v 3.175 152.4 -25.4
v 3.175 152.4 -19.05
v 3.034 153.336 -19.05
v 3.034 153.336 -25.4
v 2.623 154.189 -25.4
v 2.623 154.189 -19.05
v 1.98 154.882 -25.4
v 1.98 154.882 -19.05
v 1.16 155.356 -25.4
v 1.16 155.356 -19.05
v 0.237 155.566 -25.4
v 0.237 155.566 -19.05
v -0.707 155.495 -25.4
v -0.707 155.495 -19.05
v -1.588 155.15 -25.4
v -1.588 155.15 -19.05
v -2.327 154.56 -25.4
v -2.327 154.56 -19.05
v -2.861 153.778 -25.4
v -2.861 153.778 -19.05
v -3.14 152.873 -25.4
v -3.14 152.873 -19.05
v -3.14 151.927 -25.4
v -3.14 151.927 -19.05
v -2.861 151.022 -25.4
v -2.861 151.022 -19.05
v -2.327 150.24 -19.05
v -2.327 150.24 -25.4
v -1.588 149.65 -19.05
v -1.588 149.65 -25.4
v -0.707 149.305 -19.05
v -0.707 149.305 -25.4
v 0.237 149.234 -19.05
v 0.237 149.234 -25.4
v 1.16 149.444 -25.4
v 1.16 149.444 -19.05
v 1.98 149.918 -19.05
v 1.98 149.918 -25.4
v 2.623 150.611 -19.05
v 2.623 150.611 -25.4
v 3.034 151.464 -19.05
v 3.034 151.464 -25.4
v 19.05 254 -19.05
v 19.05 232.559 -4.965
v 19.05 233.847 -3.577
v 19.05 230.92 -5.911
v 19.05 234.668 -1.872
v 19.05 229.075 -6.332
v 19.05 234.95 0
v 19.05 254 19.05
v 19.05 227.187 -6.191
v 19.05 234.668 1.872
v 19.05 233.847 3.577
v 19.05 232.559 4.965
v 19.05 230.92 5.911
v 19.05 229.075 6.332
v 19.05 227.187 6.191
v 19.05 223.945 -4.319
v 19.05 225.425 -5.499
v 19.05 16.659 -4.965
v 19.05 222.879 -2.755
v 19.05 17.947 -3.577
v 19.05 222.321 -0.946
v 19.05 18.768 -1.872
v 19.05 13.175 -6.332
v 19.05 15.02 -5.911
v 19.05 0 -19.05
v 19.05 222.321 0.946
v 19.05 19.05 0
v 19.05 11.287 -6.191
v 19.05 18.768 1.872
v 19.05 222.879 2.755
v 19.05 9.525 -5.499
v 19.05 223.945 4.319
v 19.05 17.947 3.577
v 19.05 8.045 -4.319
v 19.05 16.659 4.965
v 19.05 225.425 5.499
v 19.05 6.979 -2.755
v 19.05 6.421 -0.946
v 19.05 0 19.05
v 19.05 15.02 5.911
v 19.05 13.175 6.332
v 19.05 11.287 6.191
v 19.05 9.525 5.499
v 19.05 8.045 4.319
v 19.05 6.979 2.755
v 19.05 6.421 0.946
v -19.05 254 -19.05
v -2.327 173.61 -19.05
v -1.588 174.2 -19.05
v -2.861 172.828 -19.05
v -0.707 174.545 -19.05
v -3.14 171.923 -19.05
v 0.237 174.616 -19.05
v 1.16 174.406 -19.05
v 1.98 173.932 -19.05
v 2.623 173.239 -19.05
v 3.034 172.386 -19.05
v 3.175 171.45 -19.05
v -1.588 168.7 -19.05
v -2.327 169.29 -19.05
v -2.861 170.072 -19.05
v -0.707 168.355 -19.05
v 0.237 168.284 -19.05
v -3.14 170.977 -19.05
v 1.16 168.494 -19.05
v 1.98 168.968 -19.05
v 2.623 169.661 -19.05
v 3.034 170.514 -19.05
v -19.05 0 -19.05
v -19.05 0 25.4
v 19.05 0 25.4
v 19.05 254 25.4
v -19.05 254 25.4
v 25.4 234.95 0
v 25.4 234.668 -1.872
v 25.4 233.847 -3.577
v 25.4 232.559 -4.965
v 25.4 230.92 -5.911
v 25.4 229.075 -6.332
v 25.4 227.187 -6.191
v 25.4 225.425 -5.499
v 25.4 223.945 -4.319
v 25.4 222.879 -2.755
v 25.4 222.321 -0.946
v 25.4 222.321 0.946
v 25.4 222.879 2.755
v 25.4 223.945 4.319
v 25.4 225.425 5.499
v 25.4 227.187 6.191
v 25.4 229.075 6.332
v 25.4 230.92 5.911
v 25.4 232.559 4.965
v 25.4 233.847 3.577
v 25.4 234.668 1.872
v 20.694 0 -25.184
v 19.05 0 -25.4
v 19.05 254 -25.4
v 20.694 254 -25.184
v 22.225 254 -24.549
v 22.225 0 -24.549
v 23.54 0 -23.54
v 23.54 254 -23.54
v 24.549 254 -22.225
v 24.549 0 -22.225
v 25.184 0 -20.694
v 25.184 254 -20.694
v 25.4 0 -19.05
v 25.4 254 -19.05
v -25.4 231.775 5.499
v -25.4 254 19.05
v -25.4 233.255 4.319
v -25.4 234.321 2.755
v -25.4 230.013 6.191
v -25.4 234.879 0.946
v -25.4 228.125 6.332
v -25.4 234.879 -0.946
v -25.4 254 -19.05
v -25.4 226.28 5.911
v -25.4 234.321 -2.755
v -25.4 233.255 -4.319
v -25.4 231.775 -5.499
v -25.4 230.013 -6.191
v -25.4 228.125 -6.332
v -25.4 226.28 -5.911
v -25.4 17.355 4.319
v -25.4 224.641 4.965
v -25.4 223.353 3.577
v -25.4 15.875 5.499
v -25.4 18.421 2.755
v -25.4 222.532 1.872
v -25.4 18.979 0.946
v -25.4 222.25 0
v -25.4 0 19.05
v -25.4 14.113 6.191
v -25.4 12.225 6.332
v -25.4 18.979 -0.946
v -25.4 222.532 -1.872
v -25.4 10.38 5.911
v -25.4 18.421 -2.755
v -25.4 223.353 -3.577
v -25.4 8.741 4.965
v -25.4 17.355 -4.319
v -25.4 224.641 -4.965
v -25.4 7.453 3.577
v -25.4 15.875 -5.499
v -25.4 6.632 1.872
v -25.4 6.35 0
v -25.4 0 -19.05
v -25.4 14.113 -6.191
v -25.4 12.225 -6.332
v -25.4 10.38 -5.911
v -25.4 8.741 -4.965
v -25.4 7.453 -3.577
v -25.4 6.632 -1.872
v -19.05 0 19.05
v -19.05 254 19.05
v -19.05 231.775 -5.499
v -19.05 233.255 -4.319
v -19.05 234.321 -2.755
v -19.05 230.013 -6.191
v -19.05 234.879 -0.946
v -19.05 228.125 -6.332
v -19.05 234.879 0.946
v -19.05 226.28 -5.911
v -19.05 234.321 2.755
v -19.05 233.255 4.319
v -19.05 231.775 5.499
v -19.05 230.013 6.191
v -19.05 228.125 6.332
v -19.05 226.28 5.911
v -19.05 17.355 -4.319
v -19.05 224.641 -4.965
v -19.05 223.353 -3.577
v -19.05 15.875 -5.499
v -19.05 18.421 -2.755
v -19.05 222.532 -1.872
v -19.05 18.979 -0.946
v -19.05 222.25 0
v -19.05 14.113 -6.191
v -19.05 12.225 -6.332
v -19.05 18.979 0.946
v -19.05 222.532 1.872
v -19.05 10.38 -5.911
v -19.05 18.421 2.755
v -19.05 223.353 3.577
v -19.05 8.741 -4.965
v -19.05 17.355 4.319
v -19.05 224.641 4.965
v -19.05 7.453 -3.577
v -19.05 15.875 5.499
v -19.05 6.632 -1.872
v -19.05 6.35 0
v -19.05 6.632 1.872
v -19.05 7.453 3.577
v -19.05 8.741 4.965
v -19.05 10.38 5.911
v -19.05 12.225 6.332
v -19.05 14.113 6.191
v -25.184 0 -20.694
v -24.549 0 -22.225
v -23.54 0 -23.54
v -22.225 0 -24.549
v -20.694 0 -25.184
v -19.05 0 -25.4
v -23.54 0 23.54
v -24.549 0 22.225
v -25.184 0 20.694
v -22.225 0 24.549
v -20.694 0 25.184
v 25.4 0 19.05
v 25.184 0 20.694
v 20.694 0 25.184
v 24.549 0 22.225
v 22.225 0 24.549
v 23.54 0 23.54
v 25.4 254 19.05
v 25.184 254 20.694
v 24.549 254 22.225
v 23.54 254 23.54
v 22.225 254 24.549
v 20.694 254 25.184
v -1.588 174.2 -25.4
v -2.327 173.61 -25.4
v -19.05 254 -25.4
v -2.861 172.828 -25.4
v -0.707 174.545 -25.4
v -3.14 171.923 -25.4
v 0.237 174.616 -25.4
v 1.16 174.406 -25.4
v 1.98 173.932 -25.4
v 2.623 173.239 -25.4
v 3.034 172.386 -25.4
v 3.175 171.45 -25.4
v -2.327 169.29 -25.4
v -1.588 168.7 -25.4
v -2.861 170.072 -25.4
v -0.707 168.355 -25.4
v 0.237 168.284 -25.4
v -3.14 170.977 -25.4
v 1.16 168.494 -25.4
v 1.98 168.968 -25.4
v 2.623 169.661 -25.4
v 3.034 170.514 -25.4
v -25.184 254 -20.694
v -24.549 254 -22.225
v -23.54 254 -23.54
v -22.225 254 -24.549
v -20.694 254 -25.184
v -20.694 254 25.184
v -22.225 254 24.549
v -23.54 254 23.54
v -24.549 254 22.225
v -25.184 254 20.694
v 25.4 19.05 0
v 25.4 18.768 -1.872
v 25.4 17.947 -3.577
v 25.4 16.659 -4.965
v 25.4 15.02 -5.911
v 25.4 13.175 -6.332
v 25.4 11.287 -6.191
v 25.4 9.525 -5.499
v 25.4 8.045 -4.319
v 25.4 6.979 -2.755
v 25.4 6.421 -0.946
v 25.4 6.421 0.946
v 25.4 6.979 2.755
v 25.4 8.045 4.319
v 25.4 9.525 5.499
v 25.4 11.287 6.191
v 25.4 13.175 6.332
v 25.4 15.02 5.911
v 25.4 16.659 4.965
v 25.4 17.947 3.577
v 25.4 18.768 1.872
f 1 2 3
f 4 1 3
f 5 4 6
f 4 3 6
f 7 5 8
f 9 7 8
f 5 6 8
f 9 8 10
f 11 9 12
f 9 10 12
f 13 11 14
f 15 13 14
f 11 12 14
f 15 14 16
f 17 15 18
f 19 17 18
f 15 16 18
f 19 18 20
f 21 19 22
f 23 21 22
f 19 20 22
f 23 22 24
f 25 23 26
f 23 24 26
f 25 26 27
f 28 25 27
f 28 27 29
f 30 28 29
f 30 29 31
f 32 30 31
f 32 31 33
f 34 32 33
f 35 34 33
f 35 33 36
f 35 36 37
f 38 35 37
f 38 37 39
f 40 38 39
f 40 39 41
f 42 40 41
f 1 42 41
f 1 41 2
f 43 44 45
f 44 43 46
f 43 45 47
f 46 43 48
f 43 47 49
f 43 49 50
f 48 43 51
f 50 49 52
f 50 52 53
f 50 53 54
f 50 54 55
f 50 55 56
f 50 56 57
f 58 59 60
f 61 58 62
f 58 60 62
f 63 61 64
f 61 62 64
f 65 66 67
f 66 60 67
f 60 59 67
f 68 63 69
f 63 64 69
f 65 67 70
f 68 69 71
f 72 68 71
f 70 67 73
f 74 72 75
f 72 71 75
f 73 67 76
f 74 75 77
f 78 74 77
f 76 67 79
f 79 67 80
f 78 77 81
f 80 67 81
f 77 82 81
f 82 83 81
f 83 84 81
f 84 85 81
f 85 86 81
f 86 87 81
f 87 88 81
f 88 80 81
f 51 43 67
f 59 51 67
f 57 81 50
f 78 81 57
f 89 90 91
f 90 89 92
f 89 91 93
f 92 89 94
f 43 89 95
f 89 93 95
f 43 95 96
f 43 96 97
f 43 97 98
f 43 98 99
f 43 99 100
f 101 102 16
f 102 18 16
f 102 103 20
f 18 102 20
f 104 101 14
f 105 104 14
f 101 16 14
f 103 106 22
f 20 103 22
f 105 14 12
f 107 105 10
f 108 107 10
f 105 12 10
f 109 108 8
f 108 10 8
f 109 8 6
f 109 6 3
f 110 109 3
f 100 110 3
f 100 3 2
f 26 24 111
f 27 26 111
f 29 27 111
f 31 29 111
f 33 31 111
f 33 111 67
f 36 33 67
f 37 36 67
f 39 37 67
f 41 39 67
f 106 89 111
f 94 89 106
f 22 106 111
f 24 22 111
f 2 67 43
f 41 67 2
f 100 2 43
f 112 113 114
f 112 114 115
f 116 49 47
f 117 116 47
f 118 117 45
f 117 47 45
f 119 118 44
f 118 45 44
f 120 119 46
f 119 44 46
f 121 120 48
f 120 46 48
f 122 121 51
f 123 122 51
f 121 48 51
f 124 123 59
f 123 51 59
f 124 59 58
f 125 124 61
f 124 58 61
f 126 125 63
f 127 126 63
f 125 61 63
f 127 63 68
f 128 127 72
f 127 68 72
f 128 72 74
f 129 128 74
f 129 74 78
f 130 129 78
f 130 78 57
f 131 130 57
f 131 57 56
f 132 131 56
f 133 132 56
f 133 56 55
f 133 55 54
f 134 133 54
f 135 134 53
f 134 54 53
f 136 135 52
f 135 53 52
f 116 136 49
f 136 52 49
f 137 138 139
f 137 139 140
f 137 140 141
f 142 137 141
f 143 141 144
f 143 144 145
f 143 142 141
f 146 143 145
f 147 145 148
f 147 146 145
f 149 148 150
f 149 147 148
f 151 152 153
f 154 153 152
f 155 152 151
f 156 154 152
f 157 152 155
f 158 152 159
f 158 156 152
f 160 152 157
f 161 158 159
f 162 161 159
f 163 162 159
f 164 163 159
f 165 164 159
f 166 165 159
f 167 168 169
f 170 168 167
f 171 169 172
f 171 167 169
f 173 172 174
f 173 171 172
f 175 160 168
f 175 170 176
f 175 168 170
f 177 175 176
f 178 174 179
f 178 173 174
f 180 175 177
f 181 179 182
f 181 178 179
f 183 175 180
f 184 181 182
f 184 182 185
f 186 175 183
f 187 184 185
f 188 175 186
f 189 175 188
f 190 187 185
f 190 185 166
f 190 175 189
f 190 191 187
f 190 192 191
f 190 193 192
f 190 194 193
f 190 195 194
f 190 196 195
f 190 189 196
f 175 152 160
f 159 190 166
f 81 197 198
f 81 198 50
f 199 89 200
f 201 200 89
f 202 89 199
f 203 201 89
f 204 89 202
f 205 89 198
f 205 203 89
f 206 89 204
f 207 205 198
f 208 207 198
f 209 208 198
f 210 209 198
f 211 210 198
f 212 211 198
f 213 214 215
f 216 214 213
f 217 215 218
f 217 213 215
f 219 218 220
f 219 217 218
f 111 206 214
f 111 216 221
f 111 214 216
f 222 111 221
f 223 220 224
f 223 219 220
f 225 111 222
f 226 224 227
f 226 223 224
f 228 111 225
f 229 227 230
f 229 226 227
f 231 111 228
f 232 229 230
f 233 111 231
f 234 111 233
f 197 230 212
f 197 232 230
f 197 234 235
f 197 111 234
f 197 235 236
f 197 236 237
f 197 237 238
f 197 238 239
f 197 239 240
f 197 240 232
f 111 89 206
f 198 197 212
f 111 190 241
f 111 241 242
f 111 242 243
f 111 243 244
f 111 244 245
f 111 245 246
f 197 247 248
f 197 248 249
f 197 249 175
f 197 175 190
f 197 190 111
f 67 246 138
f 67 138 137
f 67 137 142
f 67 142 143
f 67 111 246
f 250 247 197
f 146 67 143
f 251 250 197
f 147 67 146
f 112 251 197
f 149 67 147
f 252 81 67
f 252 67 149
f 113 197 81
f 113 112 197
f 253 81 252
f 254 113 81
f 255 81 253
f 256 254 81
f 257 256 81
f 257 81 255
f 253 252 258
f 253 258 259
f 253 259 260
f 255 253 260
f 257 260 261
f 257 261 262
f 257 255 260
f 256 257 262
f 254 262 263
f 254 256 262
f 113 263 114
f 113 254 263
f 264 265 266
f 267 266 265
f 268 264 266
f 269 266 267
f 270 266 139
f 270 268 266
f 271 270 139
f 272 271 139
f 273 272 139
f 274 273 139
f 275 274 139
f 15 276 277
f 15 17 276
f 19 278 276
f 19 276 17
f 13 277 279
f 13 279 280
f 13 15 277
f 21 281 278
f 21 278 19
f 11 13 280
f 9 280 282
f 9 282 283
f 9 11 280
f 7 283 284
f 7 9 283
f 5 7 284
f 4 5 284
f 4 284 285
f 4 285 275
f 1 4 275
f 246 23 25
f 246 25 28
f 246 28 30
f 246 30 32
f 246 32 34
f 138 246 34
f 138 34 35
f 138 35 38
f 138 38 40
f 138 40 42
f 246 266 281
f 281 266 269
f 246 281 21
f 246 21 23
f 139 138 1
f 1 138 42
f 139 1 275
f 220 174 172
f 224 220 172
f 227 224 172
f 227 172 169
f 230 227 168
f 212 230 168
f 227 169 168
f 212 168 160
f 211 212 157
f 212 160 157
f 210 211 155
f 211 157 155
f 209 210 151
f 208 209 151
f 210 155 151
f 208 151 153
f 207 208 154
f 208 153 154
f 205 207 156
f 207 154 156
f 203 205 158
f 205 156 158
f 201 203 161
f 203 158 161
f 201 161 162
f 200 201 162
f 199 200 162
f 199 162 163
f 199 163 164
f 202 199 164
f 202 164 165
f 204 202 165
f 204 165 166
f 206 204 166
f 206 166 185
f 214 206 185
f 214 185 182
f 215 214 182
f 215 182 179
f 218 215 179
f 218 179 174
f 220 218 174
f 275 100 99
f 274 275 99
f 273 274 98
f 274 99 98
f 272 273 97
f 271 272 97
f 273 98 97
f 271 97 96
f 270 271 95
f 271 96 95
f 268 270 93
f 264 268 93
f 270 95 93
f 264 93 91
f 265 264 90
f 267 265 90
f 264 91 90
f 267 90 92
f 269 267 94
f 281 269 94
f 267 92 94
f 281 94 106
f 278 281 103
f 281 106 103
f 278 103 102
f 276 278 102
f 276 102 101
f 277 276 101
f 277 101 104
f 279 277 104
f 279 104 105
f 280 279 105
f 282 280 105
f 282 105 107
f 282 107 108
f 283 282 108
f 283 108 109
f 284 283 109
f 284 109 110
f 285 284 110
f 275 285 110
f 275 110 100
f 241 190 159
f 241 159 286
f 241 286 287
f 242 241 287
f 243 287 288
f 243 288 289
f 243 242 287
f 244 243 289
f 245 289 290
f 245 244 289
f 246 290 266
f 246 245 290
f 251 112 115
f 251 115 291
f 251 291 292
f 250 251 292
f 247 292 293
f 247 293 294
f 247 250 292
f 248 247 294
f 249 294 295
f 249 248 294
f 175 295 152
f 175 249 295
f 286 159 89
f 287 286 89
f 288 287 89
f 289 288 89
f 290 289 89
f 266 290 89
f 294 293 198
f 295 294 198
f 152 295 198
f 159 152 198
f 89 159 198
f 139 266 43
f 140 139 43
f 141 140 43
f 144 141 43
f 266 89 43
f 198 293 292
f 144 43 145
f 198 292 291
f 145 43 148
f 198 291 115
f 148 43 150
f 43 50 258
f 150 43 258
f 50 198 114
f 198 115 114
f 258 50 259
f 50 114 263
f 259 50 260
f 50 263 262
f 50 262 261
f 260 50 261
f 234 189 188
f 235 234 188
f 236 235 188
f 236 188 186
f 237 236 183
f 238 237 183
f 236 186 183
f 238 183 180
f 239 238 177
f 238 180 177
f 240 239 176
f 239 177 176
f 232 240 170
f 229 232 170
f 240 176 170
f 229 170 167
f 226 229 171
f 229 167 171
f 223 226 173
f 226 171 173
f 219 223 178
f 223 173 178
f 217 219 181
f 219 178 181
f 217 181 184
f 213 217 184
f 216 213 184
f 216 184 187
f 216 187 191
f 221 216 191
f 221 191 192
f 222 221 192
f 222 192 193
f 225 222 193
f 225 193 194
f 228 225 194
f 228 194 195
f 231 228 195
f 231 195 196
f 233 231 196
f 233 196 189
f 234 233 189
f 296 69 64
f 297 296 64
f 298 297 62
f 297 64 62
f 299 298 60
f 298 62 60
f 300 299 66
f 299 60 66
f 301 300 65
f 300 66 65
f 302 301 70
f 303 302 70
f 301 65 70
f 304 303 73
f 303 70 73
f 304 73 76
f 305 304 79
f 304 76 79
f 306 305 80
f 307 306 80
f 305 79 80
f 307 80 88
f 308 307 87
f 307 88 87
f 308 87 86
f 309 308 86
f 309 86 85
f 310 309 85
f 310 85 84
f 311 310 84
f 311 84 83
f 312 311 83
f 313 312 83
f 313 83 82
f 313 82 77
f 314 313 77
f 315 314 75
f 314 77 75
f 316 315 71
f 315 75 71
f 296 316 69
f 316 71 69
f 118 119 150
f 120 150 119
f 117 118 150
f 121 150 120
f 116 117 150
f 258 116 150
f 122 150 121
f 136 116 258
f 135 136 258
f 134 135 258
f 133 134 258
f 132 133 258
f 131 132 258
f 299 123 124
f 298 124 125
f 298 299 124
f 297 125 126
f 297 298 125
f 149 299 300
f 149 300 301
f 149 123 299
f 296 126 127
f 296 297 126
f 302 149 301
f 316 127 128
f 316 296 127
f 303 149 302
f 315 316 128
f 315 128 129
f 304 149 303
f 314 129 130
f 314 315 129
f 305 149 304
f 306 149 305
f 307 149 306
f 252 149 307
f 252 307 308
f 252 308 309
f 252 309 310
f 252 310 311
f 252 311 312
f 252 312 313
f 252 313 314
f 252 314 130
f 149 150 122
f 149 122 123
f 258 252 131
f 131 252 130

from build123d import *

# Parameters (mm, degrees)
F0_W     = 38.1
F0_H     = 38.1
F4_DEPTH = 254
F6_D     = 12.7
F6_DEPTH = 25.401
F1_D     = 12.7
F3_D     = 6.35
F3_DEPTH = 25.401


with BuildPart() as f4:
    # F0 (on Front) → F4 (new body)
    with BuildSketch(Plane.XZ):
        with BuildLine():
            Line((-19.05, -25.4), (19.05, -25.4))
            ThreePointArc((19.05, -25.4), (23.5401280605, -23.5401280605), (25.4, -19.05))
            Line((25.4, -19.05), (25.4, 19.05))
            ThreePointArc((25.4, 19.05), (23.5401280605, 23.5401280605), (19.05, 25.4))
            Line((19.05, 25.4), (-19.05, 25.4))
            ThreePointArc((-19.05, 25.4), (-23.5401280605, 23.5401280605), (-25.4, 19.05))
            Line((-25.4, 19.05), (-25.4, -19.05))
            ThreePointArc((-25.4, -19.05), (-23.5401280605, -23.5401280605), (-19.05, -25.4))
        make_face()
        Rectangle(F0_W, F0_H, mode=Mode.SUBTRACT)
    extrude(amount=-F4_DEPTH)

    # F6 (through all, one way)
    with BuildSketch(Plane(origin=(0, 0, 0), x_dir=(0, 1, 0), z_dir=(-1, 0, 0))):
        with Locations((12.7, 0), (228.6, 0)):
            Circle(F6_D / 2)
    extrude(amount=-F6_DEPTH, mode=Mode.SUBTRACT)

    # F1 (through all)
    with Locations(Plane.YZ):
        with Locations((12.7, 0), (228.6, 0)):
            Hole(F1_D / 2)

    # F3 (through all, one way)
    with BuildSketch(Plane.XY):
        with Locations((0, 171.45), (0, 152.4)):
            Circle(F3_D / 2)
    extrude(amount=-F3_DEPTH, mode=Mode.SUBTRACT)


solid = f4.part
